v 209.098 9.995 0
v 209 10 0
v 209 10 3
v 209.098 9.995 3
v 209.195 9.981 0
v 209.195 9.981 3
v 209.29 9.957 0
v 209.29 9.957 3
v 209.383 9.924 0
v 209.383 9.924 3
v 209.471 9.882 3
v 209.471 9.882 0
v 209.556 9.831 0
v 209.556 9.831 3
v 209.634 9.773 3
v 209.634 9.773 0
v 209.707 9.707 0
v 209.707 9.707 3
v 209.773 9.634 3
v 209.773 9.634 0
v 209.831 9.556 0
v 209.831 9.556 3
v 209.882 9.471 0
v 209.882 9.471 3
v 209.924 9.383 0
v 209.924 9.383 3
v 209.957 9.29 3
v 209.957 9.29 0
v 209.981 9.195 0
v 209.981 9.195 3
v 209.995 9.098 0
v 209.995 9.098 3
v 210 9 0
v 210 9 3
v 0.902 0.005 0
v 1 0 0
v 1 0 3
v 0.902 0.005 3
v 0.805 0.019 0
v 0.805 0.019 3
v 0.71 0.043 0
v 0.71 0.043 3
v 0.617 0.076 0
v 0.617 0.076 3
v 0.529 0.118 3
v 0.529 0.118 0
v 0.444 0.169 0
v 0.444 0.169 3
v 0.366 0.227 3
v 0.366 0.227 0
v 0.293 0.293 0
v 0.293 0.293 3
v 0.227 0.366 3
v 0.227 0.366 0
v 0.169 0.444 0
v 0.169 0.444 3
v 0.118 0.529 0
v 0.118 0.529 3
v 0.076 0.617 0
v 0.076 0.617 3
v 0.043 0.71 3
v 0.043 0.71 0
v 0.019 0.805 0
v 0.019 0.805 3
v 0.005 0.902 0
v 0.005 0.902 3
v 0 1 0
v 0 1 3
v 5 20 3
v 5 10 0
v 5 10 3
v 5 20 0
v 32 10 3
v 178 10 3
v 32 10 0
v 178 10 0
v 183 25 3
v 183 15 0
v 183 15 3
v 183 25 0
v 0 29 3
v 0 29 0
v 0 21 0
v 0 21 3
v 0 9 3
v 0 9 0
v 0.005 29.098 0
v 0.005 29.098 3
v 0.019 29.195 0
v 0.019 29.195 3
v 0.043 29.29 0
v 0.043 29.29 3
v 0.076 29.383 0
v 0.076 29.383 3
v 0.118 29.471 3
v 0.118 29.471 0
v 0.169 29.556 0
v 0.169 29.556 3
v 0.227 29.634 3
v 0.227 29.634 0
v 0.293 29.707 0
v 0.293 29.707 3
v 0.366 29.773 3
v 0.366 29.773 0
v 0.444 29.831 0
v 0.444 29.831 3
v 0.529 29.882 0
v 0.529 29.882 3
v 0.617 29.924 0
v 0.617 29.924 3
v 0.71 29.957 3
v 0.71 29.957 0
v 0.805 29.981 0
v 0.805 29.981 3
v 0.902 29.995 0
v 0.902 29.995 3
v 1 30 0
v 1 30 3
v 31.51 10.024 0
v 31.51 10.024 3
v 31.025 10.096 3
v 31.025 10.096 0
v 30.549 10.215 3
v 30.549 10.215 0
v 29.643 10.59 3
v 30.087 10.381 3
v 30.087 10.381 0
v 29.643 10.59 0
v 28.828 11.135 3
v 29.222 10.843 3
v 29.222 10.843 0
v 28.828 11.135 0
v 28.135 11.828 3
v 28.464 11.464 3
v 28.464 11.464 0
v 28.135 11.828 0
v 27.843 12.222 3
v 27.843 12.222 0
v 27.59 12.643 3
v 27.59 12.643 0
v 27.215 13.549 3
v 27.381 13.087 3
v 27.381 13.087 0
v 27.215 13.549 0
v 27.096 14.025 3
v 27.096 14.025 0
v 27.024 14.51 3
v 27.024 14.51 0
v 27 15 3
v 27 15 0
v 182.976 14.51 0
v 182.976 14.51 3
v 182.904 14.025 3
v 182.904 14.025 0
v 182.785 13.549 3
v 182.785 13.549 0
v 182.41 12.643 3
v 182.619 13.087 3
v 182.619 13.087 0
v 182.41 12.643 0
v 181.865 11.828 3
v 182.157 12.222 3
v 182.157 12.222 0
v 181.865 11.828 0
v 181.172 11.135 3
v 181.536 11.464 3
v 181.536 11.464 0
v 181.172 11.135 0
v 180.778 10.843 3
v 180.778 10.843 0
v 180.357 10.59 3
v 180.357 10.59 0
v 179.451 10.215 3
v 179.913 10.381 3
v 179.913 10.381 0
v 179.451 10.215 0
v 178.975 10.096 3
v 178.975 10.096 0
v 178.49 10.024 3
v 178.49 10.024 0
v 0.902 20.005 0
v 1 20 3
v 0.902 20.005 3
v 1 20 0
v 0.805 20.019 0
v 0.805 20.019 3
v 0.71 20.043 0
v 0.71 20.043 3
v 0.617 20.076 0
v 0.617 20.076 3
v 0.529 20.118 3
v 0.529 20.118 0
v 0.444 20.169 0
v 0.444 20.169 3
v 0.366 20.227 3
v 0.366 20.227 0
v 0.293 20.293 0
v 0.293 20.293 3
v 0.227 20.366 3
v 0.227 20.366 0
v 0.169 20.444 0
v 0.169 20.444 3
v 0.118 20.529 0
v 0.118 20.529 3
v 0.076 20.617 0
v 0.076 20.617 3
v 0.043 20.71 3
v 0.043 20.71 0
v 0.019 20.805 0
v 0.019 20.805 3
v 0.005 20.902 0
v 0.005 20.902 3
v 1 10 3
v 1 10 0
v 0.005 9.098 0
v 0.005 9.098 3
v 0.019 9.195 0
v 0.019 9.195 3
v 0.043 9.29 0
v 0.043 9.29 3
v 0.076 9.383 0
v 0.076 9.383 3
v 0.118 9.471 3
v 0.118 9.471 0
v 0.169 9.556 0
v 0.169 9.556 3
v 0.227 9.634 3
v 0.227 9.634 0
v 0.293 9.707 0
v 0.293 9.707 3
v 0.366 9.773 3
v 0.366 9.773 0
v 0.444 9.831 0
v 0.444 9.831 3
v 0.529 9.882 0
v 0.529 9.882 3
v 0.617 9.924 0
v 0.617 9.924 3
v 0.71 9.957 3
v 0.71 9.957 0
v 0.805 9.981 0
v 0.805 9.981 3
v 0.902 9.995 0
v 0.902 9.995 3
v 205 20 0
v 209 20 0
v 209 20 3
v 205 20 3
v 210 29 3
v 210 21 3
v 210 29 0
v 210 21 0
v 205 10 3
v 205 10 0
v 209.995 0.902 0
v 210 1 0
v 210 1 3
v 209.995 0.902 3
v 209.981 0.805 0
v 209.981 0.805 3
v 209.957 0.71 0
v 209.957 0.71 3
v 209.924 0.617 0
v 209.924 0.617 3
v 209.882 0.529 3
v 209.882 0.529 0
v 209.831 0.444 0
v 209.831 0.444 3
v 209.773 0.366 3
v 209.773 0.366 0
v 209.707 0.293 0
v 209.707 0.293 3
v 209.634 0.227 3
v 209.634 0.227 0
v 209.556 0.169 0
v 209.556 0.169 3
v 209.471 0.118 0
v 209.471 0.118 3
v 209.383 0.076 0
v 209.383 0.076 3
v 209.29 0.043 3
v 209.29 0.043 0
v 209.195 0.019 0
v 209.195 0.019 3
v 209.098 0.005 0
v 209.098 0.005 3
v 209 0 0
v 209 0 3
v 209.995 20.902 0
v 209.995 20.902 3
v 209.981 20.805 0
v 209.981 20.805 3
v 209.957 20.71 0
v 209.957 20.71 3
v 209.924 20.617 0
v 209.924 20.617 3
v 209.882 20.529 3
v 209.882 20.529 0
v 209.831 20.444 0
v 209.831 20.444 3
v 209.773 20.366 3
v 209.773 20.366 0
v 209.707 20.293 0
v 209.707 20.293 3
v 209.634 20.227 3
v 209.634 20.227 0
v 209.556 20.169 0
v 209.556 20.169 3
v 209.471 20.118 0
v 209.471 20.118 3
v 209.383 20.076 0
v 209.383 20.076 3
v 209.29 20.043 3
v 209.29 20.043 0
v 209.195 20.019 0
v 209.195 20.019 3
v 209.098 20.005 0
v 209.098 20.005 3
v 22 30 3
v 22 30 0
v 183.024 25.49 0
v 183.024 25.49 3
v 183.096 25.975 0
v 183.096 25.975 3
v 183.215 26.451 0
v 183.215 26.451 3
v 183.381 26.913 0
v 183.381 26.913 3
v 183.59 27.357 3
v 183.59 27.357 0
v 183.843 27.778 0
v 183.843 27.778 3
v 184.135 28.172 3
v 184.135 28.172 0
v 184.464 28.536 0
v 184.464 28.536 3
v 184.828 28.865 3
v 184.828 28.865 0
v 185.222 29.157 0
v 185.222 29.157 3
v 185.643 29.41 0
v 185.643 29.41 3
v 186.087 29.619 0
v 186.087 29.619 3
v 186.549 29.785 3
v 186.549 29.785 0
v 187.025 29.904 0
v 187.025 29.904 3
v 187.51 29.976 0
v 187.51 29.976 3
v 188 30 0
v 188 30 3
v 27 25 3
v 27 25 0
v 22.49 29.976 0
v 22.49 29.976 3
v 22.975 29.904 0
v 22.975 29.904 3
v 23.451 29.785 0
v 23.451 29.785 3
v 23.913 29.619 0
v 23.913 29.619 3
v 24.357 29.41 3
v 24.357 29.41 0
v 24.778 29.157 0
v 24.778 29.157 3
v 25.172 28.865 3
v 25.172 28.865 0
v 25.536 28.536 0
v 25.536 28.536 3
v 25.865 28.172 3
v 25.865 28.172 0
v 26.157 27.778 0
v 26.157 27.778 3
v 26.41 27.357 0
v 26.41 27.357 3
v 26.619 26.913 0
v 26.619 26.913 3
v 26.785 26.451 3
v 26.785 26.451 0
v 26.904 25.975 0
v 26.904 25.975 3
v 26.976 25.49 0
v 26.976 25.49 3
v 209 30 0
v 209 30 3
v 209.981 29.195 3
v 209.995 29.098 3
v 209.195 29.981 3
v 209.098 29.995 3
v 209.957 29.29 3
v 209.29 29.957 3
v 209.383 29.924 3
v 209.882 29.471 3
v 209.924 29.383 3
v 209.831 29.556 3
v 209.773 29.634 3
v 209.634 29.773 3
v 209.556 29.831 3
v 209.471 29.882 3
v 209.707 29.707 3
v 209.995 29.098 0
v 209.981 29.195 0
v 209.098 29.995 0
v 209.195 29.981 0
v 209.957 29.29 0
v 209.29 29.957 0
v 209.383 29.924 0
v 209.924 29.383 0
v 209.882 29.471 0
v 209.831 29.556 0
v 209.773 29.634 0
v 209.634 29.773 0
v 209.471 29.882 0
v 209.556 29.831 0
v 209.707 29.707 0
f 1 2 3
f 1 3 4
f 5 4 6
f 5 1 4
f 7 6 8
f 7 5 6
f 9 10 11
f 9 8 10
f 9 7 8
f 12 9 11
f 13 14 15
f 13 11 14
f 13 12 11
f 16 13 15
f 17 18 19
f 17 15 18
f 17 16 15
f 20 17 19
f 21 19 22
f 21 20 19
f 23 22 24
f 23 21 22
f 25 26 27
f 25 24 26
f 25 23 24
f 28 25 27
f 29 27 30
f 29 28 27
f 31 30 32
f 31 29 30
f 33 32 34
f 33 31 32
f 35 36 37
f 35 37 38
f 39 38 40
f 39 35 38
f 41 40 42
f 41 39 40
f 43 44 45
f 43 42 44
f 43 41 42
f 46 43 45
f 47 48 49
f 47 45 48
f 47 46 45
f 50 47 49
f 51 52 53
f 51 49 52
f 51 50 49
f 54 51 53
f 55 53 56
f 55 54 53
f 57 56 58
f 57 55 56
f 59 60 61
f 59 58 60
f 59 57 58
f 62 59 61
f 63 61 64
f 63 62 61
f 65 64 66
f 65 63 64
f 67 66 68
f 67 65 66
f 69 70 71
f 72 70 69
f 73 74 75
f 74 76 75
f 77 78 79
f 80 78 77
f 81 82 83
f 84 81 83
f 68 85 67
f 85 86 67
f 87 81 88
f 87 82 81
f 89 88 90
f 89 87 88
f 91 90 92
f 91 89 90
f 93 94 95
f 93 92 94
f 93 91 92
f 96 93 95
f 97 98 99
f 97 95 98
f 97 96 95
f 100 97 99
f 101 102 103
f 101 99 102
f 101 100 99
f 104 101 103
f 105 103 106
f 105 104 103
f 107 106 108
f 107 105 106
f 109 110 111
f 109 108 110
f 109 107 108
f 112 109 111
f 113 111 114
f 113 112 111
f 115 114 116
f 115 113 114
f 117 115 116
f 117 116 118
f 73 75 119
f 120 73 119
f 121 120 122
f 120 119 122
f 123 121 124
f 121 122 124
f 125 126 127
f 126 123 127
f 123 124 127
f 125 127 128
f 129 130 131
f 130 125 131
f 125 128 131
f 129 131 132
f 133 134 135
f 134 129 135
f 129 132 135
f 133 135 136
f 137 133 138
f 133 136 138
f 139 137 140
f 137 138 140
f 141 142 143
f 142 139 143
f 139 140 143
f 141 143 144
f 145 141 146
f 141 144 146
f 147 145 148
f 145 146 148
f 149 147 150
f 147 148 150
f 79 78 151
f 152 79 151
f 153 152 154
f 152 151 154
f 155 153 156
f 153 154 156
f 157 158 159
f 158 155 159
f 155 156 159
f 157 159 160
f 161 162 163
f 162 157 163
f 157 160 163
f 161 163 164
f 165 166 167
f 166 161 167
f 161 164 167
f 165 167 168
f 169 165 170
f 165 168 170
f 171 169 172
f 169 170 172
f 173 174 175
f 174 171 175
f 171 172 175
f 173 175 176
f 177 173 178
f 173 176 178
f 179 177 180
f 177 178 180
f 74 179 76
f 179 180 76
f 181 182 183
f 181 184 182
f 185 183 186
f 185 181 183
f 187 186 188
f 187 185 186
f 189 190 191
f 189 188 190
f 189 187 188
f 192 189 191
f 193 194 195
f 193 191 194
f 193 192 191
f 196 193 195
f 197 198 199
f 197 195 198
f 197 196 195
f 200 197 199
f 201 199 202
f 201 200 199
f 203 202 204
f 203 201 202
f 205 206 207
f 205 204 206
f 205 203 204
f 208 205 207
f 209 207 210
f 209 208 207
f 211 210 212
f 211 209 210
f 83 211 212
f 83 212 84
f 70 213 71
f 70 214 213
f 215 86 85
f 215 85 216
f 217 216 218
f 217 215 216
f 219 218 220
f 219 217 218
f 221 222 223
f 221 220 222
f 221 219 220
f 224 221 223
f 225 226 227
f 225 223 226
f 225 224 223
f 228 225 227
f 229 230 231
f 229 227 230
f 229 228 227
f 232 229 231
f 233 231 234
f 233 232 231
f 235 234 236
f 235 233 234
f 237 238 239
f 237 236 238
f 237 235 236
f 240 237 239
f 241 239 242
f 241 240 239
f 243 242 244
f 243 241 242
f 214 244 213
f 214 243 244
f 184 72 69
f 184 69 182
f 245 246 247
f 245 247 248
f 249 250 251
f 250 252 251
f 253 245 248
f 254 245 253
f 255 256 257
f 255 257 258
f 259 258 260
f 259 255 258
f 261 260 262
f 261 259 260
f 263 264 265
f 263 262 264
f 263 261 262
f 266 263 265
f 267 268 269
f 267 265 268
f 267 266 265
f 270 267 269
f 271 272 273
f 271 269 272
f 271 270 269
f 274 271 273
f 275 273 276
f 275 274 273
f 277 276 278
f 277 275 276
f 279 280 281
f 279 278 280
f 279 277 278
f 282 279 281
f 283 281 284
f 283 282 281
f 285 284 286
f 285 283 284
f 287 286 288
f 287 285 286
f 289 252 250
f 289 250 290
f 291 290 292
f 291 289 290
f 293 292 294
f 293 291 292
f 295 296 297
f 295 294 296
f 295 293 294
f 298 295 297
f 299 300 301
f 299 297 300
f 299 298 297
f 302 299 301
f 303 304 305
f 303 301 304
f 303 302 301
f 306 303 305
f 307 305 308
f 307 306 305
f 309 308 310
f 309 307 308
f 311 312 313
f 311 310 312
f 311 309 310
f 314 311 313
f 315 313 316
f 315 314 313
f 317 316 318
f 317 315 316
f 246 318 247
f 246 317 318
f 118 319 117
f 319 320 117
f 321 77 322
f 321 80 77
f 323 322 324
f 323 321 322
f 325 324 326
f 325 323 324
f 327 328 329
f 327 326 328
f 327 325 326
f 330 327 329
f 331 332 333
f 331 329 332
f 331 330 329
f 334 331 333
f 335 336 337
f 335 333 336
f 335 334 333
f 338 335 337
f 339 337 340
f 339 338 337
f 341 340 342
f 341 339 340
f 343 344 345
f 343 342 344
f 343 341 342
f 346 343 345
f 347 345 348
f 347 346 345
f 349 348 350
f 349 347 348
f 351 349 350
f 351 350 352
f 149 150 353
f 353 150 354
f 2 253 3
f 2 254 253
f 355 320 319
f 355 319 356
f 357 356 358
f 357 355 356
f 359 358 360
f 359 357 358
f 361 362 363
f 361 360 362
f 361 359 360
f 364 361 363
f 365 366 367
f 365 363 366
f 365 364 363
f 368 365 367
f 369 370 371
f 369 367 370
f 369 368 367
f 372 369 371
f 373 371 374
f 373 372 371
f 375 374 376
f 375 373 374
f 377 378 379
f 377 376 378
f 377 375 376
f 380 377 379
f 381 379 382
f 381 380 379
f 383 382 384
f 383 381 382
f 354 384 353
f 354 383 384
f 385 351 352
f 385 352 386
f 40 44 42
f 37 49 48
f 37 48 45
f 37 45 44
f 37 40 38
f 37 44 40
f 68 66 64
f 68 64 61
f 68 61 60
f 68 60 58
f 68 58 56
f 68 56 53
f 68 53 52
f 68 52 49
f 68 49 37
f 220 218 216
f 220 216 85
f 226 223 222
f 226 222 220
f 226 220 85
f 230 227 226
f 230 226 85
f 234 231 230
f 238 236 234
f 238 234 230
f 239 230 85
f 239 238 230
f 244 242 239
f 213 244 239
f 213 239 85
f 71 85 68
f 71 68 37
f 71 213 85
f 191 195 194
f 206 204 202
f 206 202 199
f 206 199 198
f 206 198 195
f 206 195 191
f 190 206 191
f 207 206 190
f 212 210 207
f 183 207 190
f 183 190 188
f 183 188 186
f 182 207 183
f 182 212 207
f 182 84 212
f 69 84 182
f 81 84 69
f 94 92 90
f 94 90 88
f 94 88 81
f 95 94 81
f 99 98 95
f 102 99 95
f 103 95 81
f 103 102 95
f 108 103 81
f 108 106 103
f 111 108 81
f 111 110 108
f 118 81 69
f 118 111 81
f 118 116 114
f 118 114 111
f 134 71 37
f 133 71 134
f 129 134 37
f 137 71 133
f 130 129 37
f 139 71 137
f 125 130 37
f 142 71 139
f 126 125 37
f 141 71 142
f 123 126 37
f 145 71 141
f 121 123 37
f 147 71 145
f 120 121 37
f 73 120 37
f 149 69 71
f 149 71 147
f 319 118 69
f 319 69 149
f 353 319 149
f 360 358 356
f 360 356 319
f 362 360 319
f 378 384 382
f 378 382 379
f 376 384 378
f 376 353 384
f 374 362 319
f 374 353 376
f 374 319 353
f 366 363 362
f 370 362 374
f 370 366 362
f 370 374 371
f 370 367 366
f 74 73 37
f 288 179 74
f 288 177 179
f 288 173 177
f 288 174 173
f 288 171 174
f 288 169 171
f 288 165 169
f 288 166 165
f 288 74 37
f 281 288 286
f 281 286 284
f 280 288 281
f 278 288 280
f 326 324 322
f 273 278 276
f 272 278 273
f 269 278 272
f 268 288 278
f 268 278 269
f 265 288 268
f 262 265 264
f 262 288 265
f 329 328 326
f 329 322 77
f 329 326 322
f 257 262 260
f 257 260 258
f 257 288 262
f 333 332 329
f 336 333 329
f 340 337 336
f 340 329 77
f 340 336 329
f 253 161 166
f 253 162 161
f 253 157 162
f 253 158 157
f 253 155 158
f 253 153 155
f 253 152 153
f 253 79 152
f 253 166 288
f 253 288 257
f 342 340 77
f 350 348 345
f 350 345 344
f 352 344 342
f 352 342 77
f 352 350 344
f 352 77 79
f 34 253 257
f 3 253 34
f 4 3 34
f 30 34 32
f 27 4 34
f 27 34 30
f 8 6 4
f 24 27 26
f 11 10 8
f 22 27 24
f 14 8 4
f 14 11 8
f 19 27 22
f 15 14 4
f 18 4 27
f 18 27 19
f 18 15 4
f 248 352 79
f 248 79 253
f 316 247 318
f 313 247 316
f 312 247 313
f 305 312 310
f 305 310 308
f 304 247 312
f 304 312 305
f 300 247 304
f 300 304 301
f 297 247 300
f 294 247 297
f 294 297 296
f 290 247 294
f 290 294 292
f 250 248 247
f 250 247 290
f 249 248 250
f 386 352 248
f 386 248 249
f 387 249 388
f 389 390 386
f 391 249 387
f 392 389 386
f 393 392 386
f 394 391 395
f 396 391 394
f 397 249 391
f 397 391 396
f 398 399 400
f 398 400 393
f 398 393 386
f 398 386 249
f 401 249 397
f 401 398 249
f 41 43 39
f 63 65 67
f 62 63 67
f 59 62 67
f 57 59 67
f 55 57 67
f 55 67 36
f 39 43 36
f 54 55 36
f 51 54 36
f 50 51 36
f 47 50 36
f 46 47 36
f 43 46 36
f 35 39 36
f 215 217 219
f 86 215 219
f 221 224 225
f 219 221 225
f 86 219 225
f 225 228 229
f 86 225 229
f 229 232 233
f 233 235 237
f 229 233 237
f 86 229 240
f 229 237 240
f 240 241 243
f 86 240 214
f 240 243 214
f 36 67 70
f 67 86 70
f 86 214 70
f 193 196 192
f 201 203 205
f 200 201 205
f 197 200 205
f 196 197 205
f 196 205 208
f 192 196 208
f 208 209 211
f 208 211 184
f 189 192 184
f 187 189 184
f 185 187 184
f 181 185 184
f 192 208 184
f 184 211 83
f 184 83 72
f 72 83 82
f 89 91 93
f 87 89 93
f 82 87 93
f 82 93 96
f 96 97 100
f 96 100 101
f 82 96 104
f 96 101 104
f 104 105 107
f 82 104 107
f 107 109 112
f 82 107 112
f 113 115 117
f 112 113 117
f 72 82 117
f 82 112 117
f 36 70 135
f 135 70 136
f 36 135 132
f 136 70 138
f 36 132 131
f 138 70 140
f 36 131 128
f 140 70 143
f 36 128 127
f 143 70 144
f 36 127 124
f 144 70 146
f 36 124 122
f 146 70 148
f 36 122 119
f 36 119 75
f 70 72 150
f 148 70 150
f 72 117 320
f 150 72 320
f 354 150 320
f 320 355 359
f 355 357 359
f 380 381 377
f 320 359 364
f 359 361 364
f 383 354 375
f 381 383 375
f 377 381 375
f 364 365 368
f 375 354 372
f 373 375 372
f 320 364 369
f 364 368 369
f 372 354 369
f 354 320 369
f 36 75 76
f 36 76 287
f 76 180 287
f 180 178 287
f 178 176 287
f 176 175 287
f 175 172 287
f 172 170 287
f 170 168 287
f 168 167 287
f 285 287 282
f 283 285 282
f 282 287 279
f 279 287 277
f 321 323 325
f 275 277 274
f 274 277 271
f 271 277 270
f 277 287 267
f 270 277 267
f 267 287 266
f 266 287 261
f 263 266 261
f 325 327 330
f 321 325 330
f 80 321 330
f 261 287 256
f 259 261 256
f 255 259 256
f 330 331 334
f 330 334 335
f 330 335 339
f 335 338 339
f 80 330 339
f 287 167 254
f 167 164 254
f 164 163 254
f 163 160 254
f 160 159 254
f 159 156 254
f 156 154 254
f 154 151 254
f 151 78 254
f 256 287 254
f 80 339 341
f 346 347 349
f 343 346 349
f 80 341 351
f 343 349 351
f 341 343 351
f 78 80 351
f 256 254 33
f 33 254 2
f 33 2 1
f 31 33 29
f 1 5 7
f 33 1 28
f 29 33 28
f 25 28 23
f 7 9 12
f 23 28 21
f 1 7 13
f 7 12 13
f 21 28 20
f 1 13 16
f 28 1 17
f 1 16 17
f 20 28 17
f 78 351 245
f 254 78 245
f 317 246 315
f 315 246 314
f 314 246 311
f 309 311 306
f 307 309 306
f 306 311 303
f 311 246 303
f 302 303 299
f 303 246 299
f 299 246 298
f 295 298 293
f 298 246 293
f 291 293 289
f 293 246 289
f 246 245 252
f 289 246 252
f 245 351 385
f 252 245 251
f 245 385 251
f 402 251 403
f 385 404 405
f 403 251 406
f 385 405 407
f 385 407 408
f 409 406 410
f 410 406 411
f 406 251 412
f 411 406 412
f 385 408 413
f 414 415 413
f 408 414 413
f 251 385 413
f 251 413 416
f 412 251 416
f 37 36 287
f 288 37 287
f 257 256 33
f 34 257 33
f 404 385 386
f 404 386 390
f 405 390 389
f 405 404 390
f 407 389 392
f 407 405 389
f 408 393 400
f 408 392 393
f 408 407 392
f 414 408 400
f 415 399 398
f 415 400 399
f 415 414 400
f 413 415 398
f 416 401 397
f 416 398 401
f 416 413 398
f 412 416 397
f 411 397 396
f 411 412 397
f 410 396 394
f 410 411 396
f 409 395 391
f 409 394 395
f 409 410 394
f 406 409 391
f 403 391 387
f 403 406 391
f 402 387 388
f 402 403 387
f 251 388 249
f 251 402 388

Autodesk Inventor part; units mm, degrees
ref_plane "YZ Plane" through (0, 0, 0) normal (1, 0, 0) x (0, 1, 0)
ref_plane "XZ Plane" through (0, 0, 0) normal (0, 1, 0) x (-1, 0, 0)
ref_plane "XY Plane" through (0, 0, 0) normal (0, 0, 1) x (1, 0, 0)
sketch "Sketch1" plane through (0, 0, 0) normal (0, 0, 1) x (1, 0, 0)
  line L0 (1, 0) -> (209, 0)
  line L1 (178, 10) -> (32, 10)
  arc A0 (209, 0) -> (210, 1) centre (209, 1) ccw
  arc A1 (0, 1) -> (1, 0) centre (1, 1) ccw
  line L2 (27, 15) -> (27, 25)
  line L3 (22, 30) -> (1, 30)
  line L4 (1, 10) -> (5, 10)
  line L5 (5, 10) -> (5, 20)
  line L6 (5, 20) -> (1, 20)
  line L7 (0, 29) -> (0, 21)
  line L8 (0, 9) -> (0, 1)
  arc A2 (1, 30) -> (0, 29) centre (1, 29) ccw
  arc A3 (0, 21) -> (1, 20) centre (1, 21) ccw
  arc A4 (1, 10) -> (0, 9) centre (1, 9) ccw
  line L9 (183, 15) -> (183, 25)
  line L10 (188, 30) -> (209, 30)
  line L11 (209, 20) -> (205, 20)
  line L12 (205, 20) -> (205, 10)
  line L13 (205, 10) -> (209, 10)
  line L14 (210, 1) -> (210, 9)
  line L15 (210, 21) -> (210, 29)
  arc A5 (210, 29) -> (209, 30) centre (209, 29) ccw
  arc A6 (209, 20) -> (210, 21) centre (209, 21) ccw
  arc A7 (210, 9) -> (209, 10) centre (209, 9) ccw
  arc A8 (27, 25) -> (22, 30) centre (22, 25) ccw
  arc A9 (27, 15) -> (32, 10) centre (32, 15) ccw
  arc A10 (178, 10) -> (183, 15) centre (178, 15) ccw
  arc A11 (188, 30) -> (183, 25) centre (188, 25) ccw
  point P0 (0, 0)
  point P1 (183, 10)
  point P2 (27, 10)
  point P3 (27, 30)
  point P4 (0, 30)
  point P5 (210, 30)
  point P6 (183, 30)
  point P7 (210, 20)
  point P8 (210, 10)
  dimension "d0" = 10
  dimension "d2" = 1
  dimension "d8" = 27
  dimension "d9" = 10
  dimension "d11" = 5
  dimension "d12" = 1
  dimension "d13" = 27
  dimension "d14" = 5
  dimension "d15" = 10
  dimension "d16" = 10
  dimension "d17" = 30
  dimension "d18" = 1
  dimension "d19" = 30
  dimension "d20" = 210
  dimension "d21" = 5
extrude "Extrusion1" add sketch "Sketch1" along normal blind 3
properties part number "Bulkhead Brace 25100613"
